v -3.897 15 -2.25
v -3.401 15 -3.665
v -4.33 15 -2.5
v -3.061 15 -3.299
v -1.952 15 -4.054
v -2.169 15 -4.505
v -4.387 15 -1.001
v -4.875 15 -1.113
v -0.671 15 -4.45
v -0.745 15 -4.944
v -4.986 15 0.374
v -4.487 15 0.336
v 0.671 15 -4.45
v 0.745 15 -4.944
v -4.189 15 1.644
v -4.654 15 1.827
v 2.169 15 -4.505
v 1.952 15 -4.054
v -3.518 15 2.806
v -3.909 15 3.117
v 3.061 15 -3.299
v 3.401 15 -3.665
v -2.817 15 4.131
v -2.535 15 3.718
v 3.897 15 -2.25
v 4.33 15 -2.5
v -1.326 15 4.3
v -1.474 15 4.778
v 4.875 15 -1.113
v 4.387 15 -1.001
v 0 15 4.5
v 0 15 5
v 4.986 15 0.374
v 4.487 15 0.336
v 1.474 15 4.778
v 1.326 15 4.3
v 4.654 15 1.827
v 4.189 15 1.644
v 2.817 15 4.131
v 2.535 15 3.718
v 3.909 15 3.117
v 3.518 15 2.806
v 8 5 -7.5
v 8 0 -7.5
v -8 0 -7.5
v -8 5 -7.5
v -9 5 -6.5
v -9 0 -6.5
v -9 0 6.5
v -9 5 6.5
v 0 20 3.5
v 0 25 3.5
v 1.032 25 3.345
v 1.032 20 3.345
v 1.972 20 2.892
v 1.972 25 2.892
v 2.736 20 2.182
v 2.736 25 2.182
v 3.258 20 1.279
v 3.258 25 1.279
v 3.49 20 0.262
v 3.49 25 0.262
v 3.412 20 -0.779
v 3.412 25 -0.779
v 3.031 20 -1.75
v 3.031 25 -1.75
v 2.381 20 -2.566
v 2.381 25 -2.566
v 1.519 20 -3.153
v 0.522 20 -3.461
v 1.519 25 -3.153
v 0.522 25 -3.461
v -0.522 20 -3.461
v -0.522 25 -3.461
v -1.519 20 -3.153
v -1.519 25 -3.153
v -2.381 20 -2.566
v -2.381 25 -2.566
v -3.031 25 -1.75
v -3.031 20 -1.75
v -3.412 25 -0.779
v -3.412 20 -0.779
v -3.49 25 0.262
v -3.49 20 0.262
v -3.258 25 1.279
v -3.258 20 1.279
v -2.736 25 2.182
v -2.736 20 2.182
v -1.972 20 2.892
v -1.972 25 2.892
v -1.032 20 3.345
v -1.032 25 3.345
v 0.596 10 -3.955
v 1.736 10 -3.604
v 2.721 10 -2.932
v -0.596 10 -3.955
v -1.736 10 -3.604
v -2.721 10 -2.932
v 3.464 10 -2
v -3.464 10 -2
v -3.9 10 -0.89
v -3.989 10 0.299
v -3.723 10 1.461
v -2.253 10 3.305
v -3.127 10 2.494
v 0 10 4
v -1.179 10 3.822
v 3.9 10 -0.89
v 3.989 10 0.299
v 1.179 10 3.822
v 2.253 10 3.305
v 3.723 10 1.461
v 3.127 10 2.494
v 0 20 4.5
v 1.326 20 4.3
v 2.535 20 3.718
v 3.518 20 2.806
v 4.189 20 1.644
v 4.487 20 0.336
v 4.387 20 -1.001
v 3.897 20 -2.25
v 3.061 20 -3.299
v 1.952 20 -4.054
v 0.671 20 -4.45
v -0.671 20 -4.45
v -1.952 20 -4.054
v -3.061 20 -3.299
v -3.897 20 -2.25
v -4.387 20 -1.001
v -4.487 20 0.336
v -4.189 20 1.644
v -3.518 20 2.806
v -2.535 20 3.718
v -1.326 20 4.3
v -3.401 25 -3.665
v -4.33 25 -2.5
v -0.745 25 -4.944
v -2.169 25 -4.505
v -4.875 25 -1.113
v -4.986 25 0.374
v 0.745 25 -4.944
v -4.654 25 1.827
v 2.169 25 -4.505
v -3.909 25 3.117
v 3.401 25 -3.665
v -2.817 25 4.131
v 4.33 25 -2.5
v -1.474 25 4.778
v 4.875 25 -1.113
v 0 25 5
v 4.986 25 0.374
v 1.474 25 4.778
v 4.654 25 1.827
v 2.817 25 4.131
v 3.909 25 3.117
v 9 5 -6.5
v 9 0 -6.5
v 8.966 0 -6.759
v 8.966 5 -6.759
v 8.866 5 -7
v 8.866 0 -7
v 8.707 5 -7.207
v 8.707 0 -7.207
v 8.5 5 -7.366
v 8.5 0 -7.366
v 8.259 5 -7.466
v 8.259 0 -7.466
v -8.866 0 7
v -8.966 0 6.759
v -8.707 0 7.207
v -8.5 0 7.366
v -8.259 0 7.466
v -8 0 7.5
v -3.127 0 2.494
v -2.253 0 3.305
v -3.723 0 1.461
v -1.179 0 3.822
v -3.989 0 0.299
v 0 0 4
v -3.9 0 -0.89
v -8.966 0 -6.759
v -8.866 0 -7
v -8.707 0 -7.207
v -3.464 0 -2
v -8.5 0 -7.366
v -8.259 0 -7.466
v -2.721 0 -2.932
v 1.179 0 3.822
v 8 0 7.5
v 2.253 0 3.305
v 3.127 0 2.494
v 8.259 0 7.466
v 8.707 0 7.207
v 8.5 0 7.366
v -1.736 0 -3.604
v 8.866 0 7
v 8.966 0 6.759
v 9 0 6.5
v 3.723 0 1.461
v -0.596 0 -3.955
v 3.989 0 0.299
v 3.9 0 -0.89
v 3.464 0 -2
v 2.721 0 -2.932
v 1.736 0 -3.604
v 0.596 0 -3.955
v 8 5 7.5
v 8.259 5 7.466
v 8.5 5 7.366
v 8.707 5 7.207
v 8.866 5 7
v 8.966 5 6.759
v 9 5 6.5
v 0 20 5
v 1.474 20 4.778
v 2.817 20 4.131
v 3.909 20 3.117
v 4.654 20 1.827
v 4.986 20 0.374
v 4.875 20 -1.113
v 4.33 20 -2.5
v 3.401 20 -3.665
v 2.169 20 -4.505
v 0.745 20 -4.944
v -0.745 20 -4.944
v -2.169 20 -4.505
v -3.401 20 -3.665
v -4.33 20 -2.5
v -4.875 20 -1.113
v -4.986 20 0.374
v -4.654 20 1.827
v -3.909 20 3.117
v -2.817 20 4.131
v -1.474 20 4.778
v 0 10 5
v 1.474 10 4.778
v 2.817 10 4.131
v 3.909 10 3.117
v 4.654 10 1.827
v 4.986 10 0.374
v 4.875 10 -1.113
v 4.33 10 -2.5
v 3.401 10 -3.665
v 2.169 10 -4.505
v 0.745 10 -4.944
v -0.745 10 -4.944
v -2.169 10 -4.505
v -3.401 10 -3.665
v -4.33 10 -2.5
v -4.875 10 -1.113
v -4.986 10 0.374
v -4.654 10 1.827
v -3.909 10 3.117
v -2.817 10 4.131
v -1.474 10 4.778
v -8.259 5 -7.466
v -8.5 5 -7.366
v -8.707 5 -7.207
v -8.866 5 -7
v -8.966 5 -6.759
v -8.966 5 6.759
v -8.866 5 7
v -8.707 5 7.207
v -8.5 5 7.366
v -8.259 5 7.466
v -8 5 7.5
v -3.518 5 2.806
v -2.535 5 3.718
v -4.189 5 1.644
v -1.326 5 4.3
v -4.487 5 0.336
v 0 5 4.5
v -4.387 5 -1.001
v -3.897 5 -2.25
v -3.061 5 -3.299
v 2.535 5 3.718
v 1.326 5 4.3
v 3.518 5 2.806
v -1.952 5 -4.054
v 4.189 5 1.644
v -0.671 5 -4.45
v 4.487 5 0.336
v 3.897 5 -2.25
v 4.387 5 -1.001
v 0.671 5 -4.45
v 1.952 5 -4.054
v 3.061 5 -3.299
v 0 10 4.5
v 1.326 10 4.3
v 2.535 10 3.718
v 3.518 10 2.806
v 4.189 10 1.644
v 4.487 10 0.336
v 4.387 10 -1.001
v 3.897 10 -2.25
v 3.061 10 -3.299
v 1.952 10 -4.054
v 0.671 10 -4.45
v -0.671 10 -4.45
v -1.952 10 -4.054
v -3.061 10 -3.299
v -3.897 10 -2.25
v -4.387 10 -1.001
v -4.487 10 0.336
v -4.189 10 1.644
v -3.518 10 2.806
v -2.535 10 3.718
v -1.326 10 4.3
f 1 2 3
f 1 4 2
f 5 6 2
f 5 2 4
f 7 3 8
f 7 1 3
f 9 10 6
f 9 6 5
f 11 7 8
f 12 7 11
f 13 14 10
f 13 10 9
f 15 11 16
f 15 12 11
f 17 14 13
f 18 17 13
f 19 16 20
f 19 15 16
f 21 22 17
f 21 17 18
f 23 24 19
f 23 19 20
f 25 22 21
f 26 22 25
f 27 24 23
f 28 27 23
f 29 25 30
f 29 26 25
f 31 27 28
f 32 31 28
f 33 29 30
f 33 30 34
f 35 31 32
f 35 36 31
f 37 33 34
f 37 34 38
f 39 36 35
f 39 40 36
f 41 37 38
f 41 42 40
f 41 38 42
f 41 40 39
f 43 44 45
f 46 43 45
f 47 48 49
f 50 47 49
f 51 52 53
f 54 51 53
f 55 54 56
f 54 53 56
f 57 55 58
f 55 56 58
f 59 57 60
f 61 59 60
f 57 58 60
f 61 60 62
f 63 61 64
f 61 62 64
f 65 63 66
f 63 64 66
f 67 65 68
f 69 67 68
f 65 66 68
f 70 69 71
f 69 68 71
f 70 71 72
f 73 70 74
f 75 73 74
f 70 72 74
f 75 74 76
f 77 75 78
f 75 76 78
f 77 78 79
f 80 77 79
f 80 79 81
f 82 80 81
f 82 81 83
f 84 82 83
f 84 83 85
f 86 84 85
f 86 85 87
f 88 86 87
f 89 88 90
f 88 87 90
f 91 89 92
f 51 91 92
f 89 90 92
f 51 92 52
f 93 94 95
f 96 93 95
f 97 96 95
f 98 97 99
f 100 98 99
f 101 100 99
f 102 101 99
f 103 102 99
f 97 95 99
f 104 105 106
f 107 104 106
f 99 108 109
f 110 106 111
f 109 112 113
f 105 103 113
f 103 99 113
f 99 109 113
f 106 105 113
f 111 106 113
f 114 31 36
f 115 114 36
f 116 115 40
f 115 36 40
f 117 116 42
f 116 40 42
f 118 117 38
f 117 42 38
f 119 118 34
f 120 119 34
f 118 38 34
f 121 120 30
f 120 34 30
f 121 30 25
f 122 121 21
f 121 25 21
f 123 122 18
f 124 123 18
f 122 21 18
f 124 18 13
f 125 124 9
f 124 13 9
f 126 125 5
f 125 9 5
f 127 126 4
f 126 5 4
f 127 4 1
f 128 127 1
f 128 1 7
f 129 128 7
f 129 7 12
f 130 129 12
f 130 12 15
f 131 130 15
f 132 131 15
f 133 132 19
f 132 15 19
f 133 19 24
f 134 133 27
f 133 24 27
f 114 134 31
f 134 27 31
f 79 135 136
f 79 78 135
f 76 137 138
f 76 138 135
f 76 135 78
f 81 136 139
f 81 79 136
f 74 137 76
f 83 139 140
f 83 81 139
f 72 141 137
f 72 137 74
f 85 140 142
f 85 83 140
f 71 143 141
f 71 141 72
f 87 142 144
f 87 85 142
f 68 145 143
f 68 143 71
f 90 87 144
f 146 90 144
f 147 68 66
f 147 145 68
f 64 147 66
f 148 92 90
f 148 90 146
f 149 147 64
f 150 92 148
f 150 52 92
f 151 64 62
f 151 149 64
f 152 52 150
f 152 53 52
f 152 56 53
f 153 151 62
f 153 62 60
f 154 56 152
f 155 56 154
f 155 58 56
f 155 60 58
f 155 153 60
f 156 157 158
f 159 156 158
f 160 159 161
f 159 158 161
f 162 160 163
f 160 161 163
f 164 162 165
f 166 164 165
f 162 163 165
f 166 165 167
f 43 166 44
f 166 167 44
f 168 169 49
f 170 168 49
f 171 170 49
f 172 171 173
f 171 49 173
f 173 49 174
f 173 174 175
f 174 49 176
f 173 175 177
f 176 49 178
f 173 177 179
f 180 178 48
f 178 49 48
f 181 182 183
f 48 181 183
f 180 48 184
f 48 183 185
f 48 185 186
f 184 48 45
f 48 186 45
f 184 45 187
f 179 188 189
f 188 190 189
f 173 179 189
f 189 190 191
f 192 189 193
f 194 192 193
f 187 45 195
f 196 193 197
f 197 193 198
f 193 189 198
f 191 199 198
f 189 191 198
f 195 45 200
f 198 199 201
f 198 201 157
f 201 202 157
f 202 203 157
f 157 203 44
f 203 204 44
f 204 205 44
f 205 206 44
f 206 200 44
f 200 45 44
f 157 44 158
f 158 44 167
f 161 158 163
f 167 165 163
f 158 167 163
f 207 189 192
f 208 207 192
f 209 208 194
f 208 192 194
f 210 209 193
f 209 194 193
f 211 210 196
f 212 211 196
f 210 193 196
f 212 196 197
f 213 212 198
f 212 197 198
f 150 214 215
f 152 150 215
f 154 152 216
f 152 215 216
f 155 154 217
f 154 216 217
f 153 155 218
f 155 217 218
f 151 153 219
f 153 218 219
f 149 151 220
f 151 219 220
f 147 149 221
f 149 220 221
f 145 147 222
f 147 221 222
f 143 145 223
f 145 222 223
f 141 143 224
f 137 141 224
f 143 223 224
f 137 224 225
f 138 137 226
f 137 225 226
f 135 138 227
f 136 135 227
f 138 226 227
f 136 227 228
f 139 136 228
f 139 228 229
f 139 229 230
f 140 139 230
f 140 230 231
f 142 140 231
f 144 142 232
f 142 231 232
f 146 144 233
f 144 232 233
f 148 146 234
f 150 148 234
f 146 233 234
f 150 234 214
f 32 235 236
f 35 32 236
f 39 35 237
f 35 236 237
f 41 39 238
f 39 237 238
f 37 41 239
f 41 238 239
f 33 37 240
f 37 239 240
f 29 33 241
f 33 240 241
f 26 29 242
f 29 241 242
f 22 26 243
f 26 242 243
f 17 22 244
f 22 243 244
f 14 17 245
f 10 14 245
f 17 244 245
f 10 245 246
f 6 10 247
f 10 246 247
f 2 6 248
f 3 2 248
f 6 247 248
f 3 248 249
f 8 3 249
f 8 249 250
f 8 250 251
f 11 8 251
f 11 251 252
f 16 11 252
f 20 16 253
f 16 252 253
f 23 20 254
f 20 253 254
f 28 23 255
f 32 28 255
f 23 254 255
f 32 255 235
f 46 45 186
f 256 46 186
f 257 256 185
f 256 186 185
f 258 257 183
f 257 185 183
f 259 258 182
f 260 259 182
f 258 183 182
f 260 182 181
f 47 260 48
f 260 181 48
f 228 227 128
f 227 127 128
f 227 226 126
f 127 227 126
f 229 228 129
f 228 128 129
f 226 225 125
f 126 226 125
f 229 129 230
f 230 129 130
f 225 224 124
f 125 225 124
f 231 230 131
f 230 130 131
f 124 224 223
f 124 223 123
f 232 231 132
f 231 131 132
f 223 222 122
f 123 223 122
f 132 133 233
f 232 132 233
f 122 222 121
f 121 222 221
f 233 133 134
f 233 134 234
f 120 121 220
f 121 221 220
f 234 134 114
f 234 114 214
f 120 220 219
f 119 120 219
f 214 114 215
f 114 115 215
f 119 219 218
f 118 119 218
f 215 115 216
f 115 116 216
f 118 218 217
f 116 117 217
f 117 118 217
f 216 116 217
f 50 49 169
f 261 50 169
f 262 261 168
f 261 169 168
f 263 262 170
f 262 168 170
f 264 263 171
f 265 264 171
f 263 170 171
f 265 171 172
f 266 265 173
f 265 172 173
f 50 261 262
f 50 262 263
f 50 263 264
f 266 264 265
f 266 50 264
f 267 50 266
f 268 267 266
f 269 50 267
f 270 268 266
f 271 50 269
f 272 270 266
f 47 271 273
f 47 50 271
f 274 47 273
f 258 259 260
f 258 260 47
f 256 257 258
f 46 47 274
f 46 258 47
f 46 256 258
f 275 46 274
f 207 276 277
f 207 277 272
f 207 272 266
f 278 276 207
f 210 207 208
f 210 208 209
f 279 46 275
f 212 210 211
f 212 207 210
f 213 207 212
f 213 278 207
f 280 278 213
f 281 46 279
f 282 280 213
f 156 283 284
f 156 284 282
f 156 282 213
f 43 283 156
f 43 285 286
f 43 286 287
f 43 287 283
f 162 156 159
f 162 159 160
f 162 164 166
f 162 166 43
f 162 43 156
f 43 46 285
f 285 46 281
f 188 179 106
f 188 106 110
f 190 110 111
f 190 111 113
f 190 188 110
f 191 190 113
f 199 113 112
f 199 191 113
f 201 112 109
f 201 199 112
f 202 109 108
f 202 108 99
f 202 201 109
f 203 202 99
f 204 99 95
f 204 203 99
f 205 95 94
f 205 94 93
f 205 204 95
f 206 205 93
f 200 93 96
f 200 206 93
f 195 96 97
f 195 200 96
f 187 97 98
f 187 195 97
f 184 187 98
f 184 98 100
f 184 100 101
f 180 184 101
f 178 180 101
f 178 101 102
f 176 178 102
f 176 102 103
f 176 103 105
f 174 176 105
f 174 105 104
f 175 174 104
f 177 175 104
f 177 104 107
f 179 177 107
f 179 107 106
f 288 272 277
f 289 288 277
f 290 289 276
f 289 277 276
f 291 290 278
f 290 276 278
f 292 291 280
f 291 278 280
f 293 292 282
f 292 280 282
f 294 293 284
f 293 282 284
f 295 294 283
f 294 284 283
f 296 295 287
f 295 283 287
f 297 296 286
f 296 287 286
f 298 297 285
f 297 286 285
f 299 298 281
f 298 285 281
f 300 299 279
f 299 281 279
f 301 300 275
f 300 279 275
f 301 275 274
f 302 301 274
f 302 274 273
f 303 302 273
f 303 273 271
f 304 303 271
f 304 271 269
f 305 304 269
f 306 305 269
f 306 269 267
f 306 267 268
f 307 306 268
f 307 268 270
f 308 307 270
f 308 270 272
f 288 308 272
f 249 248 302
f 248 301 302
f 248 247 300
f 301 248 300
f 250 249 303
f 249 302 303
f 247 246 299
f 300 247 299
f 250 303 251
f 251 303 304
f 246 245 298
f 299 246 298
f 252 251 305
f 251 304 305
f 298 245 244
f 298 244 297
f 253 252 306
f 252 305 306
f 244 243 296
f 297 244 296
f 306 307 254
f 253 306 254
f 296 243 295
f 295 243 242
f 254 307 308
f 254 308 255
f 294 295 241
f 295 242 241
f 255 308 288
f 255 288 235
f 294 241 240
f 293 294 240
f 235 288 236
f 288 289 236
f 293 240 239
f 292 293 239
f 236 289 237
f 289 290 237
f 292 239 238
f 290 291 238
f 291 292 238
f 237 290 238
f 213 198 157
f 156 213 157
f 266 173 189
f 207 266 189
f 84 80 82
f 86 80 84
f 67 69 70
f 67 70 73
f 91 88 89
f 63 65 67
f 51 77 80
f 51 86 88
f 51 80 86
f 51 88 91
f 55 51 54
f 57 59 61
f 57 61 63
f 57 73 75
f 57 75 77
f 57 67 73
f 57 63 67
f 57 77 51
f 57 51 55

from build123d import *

# Parameters (mm, degrees)
SKETCH1_R           = 4.5
SKETCH1_R_2         = 4
BOSS_EXTRUDE1_DEPTH = 5
SKETCH1_5_R         = 4
CUT_EXTRUDE2_DEPTH  = 13.737739203
SKETCH1_6_R         = 4.5
SKETCH1_6_R_2       = 4
BOSS_EXTRUDE4_DEPTH = 10
SKETCH3_R           = 5
BOSS_EXTRUDE5_DEPTH = 5
SKETCH4_R           = 4.5
BOSS_EXTRUDE6_DEPTH = 5
SKETCH5_R           = 5
BOSS_EXTRUDE7_DEPTH = 5
SKETCH6_R           = 3.5
CUT_EXTRUDE3_DEPTH  = 5


with BuildPart() as part:
    # Sketch1 → Boss-Extrude1 (new body)
    # profile 1 of 5: a face of its own
    with BuildSketch(Plane(origin=(0, 0, 0), x_dir=(1, 0, 0), z_dir=(0, 1, 0))):
        with BuildLine():
            Line((-8, -7.5), (8, -7.5))
            ThreePointArc((8, -7.5), (8.707106781, -7.207106781), (9, -6.5))
            Line((9, -6.5), (9, 6.5))
            ThreePointArc((9, 6.5), (8.707106781, 7.207106781), (8, 7.5))
            Line((8, 7.5), (-8, 7.5))
            ThreePointArc((-8, 7.5), (-8.707106781, 7.207106781), (-9, 6.5))
            Line((-9, 6.5), (-9, -6.5))
            ThreePointArc((-9, -6.5), (-8.707106781, -7.207106781), (-8, -7.5))
        make_face()
        Circle(SKETCH1_R, mode=Mode.SUBTRACT)
        with BuildLine():
            Line((4.5, -5), (4.5, 5))
            ThreePointArc((4.5, 5), (6, 6.5), (7.5, 5))
            Line((7.5, 5), (7.5, -5))
            ThreePointArc((7.5, -5), (6, -6.5), (4.5, -5))
        make_face(mode=Mode.SUBTRACT)
        with BuildLine():
            Line((-4.5, -5), (-4.5, 5))
            ThreePointArc((-4.5, 5), (-6, 6.5), (-7.5, 5))
            Line((-7.5, 5), (-7.5, -5))
            ThreePointArc((-7.5, -5), (-6, -6.5), (-4.5, -5))
        make_face(mode=Mode.SUBTRACT)
    # profile 2 of 5: a face of its own
    with BuildSketch(Plane(origin=(0, 0, 0), x_dir=(1, 0, 0), z_dir=(0, 1, 0))):
        with BuildLine():
            ThreePointArc((-7.5, 5), (-6, 6.5), (-4.5, 5))
            Line((-4.5, 5), (-4.5, -5))
            ThreePointArc((-4.5, -5), (-6, -6.5), (-7.5, -5))
            Line((-7.5, -5), (-7.5, 5))
        make_face()
    # profile 3 of 5: a face of its own
    with BuildSketch(Plane(origin=(0, 0, 0), x_dir=(1, 0, 0), z_dir=(0, 1, 0))):
        Circle(SKETCH1_R)
        Circle(SKETCH1_R_2, mode=Mode.SUBTRACT)
    # profile 4 of 5: a face of its own
    with BuildSketch(Plane(origin=(0, 0, 0), x_dir=(1, 0, 0), z_dir=(0, 1, 0))):
        Circle(SKETCH1_R_2)
    # profile 5 of 5: a face of its own
    with BuildSketch(Plane(origin=(0, 0, 0), x_dir=(1, 0, 0), z_dir=(0, 1, 0))):
        with BuildLine():
            Line((7.5, -5), (7.5, 5))
            ThreePointArc((7.5, 5), (6, 6.5), (4.5, 5))
            Line((4.5, 5), (4.5, -5))
            ThreePointArc((4.5, -5), (6, -6.5), (7.5, -5))
        make_face()
    extrude(amount=BOSS_EXTRUDE1_DEPTH)

    # Sketch1<5> → Cut-Extrude2 (cut, through all)
    with BuildSketch(Plane(origin=(0, 0, 0), x_dir=(1, 0, 0), z_dir=(0, 1, 0))):
        with Locations(Location((0, 0, 0), (0, 0, 270))):
            Circle(SKETCH1_5_R)
    extrude(amount=CUT_EXTRUDE2_DEPTH, mode=Mode.SUBTRACT)

    # Sketch1<6> → Boss-Extrude4 (add)
    with BuildSketch(Plane(origin=(0, 0, 0), x_dir=(1, 0, 0), z_dir=(0, 1, 0))):
        with Locations(Location((0, 0, 0), (0, 0, 270))):
            Circle(SKETCH1_6_R)
        with Locations(Location((0, 0, 0), (0, 0, 270))):
            Circle(SKETCH1_6_R_2, mode=Mode.SUBTRACT)
    extrude(amount=BOSS_EXTRUDE4_DEPTH)

    # Sketch3 → Boss-Extrude5 (add)
    with BuildSketch(Plane(origin=(0, 10, 0), x_dir=(1, 0, 0), z_dir=(0, 1, 0))):
        with Locations(Location((0, 0, 0), (0, 0, 270))):
            Circle(SKETCH3_R)
    extrude(amount=BOSS_EXTRUDE5_DEPTH)

    # Sketch4 → Boss-Extrude6 (add)
    with BuildSketch(Plane(origin=(0, 15, 0), x_dir=(1, 0, 0), z_dir=(0, 1, 0))):
        with Locations(Location((0, 0, 0), (0, 0, 270))):
            Circle(SKETCH4_R)
    extrude(amount=BOSS_EXTRUDE6_DEPTH)

    # Sketch5 → Boss-Extrude7 (add)
    with BuildSketch(Plane(origin=(0, 20, 0), x_dir=(1, 0, 0), z_dir=(0, 1, 0))):
        with Locations(Location((0, 0, 0), (0, 0, 270))):
            Circle(SKETCH5_R)
    extrude(amount=BOSS_EXTRUDE7_DEPTH)

    # Sketch6 → Cut-Extrude3 (cut)
    with BuildSketch(Plane(origin=(0, 25, 0), x_dir=(1, 0, 0), z_dir=(0, 1, 0))):
        with Locations(Location((0, 0, 0), (0, 0, 270))):
            Circle(SKETCH6_R)
    extrude(amount=-CUT_EXTRUDE3_DEPTH, mode=Mode.SUBTRACT)


solid = part.part
